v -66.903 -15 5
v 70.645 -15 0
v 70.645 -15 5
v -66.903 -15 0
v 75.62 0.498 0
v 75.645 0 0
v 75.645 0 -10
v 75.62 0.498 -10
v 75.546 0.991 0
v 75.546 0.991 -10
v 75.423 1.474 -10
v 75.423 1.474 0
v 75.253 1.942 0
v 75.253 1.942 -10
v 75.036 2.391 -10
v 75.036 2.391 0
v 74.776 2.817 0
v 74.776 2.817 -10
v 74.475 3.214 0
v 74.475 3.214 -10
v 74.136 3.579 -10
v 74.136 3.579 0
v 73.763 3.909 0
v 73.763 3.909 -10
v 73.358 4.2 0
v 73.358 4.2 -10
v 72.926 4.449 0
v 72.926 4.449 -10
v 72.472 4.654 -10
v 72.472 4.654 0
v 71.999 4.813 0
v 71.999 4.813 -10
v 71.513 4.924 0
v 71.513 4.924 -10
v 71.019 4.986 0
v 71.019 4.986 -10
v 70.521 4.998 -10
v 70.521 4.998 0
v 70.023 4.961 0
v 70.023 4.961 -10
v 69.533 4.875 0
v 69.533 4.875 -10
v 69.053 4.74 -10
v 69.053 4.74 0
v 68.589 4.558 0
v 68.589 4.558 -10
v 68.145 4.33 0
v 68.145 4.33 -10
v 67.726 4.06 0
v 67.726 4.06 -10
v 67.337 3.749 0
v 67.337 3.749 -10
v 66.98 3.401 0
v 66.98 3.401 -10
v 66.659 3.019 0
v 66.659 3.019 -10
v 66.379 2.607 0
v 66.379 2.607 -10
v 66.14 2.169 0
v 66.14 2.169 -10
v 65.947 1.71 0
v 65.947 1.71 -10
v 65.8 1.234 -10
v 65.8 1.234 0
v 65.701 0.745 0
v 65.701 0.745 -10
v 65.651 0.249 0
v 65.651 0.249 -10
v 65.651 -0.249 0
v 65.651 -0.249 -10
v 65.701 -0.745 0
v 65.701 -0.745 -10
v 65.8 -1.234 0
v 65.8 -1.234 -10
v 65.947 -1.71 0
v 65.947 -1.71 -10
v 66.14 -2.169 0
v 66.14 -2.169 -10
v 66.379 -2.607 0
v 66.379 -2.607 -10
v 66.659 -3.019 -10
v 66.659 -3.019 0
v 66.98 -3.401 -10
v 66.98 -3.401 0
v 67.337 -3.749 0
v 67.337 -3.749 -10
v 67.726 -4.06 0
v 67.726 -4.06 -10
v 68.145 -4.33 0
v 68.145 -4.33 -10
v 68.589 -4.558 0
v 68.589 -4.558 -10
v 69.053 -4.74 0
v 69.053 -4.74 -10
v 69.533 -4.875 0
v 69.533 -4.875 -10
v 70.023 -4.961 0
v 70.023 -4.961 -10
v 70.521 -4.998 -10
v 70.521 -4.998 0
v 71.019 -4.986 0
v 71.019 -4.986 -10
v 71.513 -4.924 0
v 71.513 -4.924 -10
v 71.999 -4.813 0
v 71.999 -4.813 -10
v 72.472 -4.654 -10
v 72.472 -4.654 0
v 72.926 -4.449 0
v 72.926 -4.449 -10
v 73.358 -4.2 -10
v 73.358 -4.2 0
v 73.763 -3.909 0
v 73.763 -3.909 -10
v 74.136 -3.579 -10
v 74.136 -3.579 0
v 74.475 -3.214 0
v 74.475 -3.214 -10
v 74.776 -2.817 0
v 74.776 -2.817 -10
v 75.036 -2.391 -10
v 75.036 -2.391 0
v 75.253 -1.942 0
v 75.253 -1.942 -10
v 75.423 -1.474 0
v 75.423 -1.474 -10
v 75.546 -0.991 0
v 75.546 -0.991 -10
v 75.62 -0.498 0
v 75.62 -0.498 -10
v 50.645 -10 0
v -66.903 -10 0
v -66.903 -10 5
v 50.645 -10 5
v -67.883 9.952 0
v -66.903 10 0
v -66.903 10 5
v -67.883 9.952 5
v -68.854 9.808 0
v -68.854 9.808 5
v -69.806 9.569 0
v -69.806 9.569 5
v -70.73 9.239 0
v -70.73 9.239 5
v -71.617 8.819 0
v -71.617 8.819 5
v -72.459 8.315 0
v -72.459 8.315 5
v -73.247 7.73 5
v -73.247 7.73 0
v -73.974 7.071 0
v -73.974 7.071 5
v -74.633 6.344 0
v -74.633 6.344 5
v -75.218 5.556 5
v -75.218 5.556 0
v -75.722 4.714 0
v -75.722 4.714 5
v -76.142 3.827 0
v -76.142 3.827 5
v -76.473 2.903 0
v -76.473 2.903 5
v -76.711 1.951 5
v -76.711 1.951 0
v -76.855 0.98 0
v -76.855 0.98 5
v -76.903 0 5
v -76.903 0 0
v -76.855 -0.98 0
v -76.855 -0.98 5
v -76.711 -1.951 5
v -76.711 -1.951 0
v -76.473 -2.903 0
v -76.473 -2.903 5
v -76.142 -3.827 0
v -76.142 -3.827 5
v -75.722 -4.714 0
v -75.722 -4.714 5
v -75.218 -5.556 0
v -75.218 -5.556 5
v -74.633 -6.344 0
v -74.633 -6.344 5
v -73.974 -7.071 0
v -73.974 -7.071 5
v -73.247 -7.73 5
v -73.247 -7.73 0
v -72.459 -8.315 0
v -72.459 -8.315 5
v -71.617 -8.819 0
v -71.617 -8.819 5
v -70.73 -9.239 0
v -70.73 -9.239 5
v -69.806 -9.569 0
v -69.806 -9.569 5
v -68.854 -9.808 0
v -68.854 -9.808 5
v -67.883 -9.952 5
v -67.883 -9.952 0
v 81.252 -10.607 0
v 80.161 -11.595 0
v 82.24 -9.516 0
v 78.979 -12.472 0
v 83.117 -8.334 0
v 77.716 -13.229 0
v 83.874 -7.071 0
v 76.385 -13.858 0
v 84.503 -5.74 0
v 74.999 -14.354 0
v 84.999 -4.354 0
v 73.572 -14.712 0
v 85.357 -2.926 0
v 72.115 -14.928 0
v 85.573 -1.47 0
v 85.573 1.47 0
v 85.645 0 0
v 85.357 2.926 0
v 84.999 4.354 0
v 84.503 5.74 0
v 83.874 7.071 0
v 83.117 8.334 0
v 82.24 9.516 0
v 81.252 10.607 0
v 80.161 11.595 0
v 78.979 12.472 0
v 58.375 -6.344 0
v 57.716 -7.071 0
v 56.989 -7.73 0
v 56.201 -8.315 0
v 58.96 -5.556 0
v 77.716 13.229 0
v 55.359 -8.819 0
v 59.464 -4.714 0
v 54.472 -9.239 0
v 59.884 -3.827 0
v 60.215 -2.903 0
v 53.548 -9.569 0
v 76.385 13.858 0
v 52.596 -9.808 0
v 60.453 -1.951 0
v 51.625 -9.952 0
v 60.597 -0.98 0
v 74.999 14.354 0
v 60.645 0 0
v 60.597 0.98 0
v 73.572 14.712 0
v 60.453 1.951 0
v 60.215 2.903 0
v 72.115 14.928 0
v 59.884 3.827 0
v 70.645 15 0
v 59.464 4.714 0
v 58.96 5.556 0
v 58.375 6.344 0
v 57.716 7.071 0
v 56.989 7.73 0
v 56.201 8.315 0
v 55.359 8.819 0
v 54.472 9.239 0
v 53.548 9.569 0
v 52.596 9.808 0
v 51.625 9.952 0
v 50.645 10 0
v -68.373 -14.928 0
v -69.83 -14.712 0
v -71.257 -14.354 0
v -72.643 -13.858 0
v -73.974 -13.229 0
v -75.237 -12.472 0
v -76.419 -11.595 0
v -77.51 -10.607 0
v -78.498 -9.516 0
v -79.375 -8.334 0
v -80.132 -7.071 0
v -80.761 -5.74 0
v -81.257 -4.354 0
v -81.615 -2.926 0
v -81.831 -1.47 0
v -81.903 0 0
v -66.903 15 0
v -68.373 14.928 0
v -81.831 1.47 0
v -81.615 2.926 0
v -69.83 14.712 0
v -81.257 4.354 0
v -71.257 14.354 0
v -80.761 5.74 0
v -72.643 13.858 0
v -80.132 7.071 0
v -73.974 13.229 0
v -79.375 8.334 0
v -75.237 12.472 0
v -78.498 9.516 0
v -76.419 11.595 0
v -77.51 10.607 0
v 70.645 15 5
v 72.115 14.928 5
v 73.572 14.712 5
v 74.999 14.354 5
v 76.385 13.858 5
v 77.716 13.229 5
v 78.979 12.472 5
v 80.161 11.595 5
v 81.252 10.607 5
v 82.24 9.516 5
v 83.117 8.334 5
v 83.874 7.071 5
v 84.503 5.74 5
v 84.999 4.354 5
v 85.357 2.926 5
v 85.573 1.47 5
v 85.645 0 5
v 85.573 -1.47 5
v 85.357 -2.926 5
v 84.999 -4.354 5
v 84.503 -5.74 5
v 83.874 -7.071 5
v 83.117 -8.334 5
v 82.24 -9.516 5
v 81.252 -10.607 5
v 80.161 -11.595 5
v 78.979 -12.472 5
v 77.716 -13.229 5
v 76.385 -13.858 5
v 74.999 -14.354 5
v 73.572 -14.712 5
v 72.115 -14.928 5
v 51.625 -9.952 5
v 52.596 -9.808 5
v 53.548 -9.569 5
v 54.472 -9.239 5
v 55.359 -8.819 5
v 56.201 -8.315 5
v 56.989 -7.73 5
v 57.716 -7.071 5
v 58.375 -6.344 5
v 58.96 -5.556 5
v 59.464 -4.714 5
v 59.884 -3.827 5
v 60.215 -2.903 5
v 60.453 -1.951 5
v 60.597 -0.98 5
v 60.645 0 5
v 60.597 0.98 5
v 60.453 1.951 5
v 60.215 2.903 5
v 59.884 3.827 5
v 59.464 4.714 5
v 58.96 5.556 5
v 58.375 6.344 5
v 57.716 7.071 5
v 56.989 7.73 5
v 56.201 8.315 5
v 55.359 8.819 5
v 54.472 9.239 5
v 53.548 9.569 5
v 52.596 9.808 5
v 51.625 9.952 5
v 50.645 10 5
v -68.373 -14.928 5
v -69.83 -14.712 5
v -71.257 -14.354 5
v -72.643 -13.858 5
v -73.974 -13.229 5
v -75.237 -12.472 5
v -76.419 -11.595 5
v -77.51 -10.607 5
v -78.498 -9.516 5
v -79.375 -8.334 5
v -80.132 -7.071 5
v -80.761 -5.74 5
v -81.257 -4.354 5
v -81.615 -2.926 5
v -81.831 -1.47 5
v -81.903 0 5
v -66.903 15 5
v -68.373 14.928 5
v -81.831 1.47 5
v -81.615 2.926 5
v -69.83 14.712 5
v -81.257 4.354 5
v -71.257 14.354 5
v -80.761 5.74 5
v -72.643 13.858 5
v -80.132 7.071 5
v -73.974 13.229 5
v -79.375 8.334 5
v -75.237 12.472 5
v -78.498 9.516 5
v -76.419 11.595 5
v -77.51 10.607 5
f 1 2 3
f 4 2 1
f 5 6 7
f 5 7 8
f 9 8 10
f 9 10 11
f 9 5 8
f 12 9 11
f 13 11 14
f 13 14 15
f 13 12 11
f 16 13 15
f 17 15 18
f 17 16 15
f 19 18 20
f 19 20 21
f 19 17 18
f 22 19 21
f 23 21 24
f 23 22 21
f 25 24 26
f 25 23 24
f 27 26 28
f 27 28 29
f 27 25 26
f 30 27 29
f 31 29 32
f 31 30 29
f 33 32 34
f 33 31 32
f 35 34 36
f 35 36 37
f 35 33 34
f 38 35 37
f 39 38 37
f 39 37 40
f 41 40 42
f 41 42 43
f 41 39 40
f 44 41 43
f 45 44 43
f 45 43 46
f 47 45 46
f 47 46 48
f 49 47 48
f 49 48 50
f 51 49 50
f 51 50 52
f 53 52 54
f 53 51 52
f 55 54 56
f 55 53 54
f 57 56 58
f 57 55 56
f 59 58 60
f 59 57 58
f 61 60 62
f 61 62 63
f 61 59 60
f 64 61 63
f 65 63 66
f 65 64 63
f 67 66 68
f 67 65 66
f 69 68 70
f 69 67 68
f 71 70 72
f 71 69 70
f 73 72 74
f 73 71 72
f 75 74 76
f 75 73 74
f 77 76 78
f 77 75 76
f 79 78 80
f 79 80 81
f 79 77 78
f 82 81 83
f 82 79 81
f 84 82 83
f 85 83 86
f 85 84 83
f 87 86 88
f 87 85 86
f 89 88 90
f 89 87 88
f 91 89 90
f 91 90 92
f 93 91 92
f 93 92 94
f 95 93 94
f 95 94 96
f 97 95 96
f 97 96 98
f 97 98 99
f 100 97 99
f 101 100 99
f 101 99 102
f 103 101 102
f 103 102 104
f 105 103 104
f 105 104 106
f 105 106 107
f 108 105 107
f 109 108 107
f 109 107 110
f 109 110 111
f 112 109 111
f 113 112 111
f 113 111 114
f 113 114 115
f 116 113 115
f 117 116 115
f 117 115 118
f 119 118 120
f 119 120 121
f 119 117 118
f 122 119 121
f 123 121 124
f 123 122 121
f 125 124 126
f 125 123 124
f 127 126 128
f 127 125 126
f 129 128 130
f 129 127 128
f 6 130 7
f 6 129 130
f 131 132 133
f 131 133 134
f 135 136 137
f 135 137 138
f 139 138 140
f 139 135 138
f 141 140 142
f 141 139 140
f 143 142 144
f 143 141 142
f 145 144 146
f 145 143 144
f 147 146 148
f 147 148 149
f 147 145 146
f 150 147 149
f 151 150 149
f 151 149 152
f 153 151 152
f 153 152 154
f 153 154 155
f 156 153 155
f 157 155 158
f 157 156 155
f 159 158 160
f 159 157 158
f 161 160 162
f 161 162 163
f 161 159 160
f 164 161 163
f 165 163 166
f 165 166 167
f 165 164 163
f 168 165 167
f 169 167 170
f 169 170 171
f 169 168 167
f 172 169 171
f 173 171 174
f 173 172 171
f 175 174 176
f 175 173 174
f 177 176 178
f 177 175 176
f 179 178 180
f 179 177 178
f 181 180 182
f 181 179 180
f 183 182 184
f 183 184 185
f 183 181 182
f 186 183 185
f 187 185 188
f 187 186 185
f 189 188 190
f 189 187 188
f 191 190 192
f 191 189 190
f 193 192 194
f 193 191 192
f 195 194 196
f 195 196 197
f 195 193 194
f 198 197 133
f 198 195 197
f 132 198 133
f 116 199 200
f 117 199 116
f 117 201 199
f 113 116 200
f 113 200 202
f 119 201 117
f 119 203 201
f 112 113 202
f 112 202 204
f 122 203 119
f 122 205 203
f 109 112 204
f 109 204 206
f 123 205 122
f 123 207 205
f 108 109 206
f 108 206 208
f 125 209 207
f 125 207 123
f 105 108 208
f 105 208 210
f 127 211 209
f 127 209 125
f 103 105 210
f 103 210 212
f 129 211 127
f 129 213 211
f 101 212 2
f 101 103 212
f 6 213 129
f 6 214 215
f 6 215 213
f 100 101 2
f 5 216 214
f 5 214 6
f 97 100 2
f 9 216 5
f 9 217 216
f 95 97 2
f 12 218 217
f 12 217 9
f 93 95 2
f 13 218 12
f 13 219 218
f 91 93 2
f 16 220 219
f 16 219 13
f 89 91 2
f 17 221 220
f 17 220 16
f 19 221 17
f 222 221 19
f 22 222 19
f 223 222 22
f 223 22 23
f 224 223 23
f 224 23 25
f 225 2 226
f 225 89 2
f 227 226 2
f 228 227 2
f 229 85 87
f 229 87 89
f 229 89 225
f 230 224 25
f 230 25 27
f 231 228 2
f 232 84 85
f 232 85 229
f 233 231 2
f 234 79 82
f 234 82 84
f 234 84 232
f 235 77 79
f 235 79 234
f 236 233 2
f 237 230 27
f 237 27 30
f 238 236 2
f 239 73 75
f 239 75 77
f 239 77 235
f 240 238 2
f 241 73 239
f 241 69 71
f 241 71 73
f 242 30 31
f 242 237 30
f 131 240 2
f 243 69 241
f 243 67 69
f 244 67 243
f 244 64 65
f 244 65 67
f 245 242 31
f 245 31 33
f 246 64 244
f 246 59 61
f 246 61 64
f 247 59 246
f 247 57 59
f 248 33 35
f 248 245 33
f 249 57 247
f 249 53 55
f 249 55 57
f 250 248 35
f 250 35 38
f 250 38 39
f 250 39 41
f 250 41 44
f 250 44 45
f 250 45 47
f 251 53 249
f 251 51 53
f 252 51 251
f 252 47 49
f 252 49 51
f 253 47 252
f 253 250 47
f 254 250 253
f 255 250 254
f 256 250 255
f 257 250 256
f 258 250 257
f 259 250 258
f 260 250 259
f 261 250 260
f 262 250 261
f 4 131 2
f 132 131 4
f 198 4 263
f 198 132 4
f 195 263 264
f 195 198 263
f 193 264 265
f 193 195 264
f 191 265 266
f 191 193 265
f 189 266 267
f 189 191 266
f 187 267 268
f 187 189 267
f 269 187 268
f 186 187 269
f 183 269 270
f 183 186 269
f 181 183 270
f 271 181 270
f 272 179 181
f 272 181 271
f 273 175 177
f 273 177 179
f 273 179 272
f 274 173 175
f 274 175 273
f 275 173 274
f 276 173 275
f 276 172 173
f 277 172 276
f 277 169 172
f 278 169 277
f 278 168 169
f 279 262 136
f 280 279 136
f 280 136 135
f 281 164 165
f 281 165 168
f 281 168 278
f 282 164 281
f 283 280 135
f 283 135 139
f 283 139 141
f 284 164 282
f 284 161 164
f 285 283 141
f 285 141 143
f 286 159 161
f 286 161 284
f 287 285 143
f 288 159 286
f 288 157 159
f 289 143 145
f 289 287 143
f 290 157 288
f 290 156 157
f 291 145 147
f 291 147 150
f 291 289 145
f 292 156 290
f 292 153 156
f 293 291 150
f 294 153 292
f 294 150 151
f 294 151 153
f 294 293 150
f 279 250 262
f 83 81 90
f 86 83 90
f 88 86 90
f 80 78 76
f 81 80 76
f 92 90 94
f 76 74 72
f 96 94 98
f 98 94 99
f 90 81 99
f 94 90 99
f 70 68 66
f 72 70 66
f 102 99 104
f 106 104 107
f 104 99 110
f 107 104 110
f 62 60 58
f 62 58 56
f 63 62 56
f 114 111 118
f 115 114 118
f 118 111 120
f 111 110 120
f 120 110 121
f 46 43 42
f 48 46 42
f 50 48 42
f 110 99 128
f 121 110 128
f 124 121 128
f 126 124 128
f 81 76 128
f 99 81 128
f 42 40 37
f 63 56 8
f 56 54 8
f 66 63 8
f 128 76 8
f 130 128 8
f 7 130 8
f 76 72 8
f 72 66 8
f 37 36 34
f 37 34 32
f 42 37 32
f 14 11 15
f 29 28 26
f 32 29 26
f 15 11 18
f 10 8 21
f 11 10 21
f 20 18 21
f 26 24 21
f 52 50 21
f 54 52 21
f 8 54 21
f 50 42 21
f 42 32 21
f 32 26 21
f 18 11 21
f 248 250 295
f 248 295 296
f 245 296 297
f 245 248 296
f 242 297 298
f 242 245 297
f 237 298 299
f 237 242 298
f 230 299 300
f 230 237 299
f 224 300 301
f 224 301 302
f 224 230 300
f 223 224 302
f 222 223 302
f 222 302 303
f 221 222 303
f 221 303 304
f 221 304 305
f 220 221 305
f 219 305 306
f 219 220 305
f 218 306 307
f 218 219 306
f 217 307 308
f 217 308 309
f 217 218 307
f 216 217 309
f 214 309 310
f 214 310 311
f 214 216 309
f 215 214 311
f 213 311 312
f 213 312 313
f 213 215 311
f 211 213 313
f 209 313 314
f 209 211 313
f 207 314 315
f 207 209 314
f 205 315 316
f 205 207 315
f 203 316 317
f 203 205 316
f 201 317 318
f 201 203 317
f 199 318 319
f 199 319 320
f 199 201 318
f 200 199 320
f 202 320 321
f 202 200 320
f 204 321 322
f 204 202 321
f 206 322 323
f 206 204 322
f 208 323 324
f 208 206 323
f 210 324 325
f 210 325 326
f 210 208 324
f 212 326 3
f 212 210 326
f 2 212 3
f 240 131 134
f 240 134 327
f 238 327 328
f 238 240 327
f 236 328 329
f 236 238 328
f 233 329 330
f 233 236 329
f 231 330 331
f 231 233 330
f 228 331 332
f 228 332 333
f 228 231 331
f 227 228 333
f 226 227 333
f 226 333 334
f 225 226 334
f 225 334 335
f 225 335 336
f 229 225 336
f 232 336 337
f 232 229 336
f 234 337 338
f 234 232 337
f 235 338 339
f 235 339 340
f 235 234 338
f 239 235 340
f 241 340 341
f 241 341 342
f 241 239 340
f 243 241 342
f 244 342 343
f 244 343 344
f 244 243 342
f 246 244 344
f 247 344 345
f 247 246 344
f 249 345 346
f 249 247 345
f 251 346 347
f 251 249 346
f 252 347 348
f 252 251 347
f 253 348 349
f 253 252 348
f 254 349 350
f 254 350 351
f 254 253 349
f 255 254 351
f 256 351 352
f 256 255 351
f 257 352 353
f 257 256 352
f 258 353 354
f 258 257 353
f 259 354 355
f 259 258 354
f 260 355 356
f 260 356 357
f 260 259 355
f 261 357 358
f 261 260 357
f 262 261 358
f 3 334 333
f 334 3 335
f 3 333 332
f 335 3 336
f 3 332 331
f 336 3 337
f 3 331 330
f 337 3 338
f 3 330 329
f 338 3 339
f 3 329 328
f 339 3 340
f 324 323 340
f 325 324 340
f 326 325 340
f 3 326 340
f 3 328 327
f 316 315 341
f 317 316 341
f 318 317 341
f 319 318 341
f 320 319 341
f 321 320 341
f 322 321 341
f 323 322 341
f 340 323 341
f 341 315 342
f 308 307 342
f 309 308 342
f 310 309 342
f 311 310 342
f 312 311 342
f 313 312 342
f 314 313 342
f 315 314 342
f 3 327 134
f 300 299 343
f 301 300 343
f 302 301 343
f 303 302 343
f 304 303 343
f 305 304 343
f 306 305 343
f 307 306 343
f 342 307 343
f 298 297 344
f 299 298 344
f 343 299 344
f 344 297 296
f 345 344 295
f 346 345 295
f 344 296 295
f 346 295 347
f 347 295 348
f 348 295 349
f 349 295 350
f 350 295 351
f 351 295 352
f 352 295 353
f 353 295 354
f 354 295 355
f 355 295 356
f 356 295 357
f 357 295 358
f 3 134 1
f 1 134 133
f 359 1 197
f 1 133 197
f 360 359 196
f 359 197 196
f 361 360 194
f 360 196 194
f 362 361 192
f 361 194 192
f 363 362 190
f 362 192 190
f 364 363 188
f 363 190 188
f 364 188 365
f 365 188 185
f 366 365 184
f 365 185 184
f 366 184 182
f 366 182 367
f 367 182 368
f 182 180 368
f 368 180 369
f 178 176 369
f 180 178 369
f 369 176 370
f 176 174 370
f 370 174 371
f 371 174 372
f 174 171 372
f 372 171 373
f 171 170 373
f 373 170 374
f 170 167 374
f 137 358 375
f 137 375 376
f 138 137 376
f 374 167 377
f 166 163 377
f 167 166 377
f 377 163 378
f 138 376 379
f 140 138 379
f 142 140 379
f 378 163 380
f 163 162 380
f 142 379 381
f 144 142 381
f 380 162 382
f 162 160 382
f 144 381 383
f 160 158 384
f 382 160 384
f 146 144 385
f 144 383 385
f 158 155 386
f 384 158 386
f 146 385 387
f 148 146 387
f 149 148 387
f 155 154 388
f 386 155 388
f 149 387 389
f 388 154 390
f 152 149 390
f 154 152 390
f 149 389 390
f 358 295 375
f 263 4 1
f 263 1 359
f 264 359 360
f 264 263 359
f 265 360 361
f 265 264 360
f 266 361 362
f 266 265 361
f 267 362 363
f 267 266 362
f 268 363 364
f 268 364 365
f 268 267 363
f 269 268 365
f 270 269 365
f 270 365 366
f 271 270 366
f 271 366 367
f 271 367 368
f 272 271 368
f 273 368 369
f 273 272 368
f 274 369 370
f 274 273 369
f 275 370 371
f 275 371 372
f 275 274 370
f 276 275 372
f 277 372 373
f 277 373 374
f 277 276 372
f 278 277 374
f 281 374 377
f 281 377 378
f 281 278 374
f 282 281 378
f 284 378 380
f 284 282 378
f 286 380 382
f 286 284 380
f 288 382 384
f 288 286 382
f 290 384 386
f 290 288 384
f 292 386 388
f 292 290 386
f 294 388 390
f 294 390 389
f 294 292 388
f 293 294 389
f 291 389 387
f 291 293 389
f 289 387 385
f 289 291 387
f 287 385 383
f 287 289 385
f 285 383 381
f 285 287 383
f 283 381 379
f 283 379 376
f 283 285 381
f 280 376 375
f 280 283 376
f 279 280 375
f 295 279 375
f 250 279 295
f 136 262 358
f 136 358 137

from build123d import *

# Parameters (mm, degrees)
SKETCH1_R           = 5
BOSS_EXTRUDE1_DEPTH = 5
SKETCH1_3_R         = 5
BOSS_EXTRUDE2_DEPTH = 10


with BuildPart() as part:
    # Sketch1 → Boss-Extrude1 (new body)
    # profile 1 of 2: a face of its own
    with BuildSketch(Plane.XY):
        with BuildLine():
            Line((-66.903225806, -15), (70.64516129, -15))
            ThreePointArc((70.64516129, -15), (85.64516129, 0), (70.64516129, 15))
            Line((70.64516129, 15), (-66.903225806, 15))
            ThreePointArc((-66.903225806, 15), (-73.026950163, 13.693063938), (-78.083565694, 10))
            ThreePointArc((-78.083565694, 10), (-81.903225806, 0), (-78.083565694, -10))
            ThreePointArc((-78.083565694, -10), (-73.026950163, -13.693063938), (-66.903225806, -15))
        make_face()
        with BuildLine():
            Line((50.64516129, -10), (-66.903225806, -10))
            ThreePointArc((-66.903225806, -10), (-76.903225806, 0), (-66.903225806, 10))
            Line((-66.903225806, 10), (50.64516129, 10))
            ThreePointArc((50.64516129, 10), (60.64516129, 0), (50.64516129, -10))
        make_face(mode=Mode.SUBTRACT)
        with Locations((70.64516129, 0)):
            Circle(SKETCH1_R, mode=Mode.SUBTRACT)
    # profile 2 of 2: a face of its own
    with BuildSketch(Plane.XY):
        with Locations((70.64516129, 0)):
            Circle(SKETCH1_R)
    extrude(amount=BOSS_EXTRUDE1_DEPTH)

    # Sketch1<3> → Boss-Extrude2 (add)
    with BuildSketch(Plane.XY):
        with Locations((70.64516129, 0)):
            Circle(SKETCH1_3_R)
    extrude(amount=-BOSS_EXTRUDE2_DEPTH)


solid = part.part
